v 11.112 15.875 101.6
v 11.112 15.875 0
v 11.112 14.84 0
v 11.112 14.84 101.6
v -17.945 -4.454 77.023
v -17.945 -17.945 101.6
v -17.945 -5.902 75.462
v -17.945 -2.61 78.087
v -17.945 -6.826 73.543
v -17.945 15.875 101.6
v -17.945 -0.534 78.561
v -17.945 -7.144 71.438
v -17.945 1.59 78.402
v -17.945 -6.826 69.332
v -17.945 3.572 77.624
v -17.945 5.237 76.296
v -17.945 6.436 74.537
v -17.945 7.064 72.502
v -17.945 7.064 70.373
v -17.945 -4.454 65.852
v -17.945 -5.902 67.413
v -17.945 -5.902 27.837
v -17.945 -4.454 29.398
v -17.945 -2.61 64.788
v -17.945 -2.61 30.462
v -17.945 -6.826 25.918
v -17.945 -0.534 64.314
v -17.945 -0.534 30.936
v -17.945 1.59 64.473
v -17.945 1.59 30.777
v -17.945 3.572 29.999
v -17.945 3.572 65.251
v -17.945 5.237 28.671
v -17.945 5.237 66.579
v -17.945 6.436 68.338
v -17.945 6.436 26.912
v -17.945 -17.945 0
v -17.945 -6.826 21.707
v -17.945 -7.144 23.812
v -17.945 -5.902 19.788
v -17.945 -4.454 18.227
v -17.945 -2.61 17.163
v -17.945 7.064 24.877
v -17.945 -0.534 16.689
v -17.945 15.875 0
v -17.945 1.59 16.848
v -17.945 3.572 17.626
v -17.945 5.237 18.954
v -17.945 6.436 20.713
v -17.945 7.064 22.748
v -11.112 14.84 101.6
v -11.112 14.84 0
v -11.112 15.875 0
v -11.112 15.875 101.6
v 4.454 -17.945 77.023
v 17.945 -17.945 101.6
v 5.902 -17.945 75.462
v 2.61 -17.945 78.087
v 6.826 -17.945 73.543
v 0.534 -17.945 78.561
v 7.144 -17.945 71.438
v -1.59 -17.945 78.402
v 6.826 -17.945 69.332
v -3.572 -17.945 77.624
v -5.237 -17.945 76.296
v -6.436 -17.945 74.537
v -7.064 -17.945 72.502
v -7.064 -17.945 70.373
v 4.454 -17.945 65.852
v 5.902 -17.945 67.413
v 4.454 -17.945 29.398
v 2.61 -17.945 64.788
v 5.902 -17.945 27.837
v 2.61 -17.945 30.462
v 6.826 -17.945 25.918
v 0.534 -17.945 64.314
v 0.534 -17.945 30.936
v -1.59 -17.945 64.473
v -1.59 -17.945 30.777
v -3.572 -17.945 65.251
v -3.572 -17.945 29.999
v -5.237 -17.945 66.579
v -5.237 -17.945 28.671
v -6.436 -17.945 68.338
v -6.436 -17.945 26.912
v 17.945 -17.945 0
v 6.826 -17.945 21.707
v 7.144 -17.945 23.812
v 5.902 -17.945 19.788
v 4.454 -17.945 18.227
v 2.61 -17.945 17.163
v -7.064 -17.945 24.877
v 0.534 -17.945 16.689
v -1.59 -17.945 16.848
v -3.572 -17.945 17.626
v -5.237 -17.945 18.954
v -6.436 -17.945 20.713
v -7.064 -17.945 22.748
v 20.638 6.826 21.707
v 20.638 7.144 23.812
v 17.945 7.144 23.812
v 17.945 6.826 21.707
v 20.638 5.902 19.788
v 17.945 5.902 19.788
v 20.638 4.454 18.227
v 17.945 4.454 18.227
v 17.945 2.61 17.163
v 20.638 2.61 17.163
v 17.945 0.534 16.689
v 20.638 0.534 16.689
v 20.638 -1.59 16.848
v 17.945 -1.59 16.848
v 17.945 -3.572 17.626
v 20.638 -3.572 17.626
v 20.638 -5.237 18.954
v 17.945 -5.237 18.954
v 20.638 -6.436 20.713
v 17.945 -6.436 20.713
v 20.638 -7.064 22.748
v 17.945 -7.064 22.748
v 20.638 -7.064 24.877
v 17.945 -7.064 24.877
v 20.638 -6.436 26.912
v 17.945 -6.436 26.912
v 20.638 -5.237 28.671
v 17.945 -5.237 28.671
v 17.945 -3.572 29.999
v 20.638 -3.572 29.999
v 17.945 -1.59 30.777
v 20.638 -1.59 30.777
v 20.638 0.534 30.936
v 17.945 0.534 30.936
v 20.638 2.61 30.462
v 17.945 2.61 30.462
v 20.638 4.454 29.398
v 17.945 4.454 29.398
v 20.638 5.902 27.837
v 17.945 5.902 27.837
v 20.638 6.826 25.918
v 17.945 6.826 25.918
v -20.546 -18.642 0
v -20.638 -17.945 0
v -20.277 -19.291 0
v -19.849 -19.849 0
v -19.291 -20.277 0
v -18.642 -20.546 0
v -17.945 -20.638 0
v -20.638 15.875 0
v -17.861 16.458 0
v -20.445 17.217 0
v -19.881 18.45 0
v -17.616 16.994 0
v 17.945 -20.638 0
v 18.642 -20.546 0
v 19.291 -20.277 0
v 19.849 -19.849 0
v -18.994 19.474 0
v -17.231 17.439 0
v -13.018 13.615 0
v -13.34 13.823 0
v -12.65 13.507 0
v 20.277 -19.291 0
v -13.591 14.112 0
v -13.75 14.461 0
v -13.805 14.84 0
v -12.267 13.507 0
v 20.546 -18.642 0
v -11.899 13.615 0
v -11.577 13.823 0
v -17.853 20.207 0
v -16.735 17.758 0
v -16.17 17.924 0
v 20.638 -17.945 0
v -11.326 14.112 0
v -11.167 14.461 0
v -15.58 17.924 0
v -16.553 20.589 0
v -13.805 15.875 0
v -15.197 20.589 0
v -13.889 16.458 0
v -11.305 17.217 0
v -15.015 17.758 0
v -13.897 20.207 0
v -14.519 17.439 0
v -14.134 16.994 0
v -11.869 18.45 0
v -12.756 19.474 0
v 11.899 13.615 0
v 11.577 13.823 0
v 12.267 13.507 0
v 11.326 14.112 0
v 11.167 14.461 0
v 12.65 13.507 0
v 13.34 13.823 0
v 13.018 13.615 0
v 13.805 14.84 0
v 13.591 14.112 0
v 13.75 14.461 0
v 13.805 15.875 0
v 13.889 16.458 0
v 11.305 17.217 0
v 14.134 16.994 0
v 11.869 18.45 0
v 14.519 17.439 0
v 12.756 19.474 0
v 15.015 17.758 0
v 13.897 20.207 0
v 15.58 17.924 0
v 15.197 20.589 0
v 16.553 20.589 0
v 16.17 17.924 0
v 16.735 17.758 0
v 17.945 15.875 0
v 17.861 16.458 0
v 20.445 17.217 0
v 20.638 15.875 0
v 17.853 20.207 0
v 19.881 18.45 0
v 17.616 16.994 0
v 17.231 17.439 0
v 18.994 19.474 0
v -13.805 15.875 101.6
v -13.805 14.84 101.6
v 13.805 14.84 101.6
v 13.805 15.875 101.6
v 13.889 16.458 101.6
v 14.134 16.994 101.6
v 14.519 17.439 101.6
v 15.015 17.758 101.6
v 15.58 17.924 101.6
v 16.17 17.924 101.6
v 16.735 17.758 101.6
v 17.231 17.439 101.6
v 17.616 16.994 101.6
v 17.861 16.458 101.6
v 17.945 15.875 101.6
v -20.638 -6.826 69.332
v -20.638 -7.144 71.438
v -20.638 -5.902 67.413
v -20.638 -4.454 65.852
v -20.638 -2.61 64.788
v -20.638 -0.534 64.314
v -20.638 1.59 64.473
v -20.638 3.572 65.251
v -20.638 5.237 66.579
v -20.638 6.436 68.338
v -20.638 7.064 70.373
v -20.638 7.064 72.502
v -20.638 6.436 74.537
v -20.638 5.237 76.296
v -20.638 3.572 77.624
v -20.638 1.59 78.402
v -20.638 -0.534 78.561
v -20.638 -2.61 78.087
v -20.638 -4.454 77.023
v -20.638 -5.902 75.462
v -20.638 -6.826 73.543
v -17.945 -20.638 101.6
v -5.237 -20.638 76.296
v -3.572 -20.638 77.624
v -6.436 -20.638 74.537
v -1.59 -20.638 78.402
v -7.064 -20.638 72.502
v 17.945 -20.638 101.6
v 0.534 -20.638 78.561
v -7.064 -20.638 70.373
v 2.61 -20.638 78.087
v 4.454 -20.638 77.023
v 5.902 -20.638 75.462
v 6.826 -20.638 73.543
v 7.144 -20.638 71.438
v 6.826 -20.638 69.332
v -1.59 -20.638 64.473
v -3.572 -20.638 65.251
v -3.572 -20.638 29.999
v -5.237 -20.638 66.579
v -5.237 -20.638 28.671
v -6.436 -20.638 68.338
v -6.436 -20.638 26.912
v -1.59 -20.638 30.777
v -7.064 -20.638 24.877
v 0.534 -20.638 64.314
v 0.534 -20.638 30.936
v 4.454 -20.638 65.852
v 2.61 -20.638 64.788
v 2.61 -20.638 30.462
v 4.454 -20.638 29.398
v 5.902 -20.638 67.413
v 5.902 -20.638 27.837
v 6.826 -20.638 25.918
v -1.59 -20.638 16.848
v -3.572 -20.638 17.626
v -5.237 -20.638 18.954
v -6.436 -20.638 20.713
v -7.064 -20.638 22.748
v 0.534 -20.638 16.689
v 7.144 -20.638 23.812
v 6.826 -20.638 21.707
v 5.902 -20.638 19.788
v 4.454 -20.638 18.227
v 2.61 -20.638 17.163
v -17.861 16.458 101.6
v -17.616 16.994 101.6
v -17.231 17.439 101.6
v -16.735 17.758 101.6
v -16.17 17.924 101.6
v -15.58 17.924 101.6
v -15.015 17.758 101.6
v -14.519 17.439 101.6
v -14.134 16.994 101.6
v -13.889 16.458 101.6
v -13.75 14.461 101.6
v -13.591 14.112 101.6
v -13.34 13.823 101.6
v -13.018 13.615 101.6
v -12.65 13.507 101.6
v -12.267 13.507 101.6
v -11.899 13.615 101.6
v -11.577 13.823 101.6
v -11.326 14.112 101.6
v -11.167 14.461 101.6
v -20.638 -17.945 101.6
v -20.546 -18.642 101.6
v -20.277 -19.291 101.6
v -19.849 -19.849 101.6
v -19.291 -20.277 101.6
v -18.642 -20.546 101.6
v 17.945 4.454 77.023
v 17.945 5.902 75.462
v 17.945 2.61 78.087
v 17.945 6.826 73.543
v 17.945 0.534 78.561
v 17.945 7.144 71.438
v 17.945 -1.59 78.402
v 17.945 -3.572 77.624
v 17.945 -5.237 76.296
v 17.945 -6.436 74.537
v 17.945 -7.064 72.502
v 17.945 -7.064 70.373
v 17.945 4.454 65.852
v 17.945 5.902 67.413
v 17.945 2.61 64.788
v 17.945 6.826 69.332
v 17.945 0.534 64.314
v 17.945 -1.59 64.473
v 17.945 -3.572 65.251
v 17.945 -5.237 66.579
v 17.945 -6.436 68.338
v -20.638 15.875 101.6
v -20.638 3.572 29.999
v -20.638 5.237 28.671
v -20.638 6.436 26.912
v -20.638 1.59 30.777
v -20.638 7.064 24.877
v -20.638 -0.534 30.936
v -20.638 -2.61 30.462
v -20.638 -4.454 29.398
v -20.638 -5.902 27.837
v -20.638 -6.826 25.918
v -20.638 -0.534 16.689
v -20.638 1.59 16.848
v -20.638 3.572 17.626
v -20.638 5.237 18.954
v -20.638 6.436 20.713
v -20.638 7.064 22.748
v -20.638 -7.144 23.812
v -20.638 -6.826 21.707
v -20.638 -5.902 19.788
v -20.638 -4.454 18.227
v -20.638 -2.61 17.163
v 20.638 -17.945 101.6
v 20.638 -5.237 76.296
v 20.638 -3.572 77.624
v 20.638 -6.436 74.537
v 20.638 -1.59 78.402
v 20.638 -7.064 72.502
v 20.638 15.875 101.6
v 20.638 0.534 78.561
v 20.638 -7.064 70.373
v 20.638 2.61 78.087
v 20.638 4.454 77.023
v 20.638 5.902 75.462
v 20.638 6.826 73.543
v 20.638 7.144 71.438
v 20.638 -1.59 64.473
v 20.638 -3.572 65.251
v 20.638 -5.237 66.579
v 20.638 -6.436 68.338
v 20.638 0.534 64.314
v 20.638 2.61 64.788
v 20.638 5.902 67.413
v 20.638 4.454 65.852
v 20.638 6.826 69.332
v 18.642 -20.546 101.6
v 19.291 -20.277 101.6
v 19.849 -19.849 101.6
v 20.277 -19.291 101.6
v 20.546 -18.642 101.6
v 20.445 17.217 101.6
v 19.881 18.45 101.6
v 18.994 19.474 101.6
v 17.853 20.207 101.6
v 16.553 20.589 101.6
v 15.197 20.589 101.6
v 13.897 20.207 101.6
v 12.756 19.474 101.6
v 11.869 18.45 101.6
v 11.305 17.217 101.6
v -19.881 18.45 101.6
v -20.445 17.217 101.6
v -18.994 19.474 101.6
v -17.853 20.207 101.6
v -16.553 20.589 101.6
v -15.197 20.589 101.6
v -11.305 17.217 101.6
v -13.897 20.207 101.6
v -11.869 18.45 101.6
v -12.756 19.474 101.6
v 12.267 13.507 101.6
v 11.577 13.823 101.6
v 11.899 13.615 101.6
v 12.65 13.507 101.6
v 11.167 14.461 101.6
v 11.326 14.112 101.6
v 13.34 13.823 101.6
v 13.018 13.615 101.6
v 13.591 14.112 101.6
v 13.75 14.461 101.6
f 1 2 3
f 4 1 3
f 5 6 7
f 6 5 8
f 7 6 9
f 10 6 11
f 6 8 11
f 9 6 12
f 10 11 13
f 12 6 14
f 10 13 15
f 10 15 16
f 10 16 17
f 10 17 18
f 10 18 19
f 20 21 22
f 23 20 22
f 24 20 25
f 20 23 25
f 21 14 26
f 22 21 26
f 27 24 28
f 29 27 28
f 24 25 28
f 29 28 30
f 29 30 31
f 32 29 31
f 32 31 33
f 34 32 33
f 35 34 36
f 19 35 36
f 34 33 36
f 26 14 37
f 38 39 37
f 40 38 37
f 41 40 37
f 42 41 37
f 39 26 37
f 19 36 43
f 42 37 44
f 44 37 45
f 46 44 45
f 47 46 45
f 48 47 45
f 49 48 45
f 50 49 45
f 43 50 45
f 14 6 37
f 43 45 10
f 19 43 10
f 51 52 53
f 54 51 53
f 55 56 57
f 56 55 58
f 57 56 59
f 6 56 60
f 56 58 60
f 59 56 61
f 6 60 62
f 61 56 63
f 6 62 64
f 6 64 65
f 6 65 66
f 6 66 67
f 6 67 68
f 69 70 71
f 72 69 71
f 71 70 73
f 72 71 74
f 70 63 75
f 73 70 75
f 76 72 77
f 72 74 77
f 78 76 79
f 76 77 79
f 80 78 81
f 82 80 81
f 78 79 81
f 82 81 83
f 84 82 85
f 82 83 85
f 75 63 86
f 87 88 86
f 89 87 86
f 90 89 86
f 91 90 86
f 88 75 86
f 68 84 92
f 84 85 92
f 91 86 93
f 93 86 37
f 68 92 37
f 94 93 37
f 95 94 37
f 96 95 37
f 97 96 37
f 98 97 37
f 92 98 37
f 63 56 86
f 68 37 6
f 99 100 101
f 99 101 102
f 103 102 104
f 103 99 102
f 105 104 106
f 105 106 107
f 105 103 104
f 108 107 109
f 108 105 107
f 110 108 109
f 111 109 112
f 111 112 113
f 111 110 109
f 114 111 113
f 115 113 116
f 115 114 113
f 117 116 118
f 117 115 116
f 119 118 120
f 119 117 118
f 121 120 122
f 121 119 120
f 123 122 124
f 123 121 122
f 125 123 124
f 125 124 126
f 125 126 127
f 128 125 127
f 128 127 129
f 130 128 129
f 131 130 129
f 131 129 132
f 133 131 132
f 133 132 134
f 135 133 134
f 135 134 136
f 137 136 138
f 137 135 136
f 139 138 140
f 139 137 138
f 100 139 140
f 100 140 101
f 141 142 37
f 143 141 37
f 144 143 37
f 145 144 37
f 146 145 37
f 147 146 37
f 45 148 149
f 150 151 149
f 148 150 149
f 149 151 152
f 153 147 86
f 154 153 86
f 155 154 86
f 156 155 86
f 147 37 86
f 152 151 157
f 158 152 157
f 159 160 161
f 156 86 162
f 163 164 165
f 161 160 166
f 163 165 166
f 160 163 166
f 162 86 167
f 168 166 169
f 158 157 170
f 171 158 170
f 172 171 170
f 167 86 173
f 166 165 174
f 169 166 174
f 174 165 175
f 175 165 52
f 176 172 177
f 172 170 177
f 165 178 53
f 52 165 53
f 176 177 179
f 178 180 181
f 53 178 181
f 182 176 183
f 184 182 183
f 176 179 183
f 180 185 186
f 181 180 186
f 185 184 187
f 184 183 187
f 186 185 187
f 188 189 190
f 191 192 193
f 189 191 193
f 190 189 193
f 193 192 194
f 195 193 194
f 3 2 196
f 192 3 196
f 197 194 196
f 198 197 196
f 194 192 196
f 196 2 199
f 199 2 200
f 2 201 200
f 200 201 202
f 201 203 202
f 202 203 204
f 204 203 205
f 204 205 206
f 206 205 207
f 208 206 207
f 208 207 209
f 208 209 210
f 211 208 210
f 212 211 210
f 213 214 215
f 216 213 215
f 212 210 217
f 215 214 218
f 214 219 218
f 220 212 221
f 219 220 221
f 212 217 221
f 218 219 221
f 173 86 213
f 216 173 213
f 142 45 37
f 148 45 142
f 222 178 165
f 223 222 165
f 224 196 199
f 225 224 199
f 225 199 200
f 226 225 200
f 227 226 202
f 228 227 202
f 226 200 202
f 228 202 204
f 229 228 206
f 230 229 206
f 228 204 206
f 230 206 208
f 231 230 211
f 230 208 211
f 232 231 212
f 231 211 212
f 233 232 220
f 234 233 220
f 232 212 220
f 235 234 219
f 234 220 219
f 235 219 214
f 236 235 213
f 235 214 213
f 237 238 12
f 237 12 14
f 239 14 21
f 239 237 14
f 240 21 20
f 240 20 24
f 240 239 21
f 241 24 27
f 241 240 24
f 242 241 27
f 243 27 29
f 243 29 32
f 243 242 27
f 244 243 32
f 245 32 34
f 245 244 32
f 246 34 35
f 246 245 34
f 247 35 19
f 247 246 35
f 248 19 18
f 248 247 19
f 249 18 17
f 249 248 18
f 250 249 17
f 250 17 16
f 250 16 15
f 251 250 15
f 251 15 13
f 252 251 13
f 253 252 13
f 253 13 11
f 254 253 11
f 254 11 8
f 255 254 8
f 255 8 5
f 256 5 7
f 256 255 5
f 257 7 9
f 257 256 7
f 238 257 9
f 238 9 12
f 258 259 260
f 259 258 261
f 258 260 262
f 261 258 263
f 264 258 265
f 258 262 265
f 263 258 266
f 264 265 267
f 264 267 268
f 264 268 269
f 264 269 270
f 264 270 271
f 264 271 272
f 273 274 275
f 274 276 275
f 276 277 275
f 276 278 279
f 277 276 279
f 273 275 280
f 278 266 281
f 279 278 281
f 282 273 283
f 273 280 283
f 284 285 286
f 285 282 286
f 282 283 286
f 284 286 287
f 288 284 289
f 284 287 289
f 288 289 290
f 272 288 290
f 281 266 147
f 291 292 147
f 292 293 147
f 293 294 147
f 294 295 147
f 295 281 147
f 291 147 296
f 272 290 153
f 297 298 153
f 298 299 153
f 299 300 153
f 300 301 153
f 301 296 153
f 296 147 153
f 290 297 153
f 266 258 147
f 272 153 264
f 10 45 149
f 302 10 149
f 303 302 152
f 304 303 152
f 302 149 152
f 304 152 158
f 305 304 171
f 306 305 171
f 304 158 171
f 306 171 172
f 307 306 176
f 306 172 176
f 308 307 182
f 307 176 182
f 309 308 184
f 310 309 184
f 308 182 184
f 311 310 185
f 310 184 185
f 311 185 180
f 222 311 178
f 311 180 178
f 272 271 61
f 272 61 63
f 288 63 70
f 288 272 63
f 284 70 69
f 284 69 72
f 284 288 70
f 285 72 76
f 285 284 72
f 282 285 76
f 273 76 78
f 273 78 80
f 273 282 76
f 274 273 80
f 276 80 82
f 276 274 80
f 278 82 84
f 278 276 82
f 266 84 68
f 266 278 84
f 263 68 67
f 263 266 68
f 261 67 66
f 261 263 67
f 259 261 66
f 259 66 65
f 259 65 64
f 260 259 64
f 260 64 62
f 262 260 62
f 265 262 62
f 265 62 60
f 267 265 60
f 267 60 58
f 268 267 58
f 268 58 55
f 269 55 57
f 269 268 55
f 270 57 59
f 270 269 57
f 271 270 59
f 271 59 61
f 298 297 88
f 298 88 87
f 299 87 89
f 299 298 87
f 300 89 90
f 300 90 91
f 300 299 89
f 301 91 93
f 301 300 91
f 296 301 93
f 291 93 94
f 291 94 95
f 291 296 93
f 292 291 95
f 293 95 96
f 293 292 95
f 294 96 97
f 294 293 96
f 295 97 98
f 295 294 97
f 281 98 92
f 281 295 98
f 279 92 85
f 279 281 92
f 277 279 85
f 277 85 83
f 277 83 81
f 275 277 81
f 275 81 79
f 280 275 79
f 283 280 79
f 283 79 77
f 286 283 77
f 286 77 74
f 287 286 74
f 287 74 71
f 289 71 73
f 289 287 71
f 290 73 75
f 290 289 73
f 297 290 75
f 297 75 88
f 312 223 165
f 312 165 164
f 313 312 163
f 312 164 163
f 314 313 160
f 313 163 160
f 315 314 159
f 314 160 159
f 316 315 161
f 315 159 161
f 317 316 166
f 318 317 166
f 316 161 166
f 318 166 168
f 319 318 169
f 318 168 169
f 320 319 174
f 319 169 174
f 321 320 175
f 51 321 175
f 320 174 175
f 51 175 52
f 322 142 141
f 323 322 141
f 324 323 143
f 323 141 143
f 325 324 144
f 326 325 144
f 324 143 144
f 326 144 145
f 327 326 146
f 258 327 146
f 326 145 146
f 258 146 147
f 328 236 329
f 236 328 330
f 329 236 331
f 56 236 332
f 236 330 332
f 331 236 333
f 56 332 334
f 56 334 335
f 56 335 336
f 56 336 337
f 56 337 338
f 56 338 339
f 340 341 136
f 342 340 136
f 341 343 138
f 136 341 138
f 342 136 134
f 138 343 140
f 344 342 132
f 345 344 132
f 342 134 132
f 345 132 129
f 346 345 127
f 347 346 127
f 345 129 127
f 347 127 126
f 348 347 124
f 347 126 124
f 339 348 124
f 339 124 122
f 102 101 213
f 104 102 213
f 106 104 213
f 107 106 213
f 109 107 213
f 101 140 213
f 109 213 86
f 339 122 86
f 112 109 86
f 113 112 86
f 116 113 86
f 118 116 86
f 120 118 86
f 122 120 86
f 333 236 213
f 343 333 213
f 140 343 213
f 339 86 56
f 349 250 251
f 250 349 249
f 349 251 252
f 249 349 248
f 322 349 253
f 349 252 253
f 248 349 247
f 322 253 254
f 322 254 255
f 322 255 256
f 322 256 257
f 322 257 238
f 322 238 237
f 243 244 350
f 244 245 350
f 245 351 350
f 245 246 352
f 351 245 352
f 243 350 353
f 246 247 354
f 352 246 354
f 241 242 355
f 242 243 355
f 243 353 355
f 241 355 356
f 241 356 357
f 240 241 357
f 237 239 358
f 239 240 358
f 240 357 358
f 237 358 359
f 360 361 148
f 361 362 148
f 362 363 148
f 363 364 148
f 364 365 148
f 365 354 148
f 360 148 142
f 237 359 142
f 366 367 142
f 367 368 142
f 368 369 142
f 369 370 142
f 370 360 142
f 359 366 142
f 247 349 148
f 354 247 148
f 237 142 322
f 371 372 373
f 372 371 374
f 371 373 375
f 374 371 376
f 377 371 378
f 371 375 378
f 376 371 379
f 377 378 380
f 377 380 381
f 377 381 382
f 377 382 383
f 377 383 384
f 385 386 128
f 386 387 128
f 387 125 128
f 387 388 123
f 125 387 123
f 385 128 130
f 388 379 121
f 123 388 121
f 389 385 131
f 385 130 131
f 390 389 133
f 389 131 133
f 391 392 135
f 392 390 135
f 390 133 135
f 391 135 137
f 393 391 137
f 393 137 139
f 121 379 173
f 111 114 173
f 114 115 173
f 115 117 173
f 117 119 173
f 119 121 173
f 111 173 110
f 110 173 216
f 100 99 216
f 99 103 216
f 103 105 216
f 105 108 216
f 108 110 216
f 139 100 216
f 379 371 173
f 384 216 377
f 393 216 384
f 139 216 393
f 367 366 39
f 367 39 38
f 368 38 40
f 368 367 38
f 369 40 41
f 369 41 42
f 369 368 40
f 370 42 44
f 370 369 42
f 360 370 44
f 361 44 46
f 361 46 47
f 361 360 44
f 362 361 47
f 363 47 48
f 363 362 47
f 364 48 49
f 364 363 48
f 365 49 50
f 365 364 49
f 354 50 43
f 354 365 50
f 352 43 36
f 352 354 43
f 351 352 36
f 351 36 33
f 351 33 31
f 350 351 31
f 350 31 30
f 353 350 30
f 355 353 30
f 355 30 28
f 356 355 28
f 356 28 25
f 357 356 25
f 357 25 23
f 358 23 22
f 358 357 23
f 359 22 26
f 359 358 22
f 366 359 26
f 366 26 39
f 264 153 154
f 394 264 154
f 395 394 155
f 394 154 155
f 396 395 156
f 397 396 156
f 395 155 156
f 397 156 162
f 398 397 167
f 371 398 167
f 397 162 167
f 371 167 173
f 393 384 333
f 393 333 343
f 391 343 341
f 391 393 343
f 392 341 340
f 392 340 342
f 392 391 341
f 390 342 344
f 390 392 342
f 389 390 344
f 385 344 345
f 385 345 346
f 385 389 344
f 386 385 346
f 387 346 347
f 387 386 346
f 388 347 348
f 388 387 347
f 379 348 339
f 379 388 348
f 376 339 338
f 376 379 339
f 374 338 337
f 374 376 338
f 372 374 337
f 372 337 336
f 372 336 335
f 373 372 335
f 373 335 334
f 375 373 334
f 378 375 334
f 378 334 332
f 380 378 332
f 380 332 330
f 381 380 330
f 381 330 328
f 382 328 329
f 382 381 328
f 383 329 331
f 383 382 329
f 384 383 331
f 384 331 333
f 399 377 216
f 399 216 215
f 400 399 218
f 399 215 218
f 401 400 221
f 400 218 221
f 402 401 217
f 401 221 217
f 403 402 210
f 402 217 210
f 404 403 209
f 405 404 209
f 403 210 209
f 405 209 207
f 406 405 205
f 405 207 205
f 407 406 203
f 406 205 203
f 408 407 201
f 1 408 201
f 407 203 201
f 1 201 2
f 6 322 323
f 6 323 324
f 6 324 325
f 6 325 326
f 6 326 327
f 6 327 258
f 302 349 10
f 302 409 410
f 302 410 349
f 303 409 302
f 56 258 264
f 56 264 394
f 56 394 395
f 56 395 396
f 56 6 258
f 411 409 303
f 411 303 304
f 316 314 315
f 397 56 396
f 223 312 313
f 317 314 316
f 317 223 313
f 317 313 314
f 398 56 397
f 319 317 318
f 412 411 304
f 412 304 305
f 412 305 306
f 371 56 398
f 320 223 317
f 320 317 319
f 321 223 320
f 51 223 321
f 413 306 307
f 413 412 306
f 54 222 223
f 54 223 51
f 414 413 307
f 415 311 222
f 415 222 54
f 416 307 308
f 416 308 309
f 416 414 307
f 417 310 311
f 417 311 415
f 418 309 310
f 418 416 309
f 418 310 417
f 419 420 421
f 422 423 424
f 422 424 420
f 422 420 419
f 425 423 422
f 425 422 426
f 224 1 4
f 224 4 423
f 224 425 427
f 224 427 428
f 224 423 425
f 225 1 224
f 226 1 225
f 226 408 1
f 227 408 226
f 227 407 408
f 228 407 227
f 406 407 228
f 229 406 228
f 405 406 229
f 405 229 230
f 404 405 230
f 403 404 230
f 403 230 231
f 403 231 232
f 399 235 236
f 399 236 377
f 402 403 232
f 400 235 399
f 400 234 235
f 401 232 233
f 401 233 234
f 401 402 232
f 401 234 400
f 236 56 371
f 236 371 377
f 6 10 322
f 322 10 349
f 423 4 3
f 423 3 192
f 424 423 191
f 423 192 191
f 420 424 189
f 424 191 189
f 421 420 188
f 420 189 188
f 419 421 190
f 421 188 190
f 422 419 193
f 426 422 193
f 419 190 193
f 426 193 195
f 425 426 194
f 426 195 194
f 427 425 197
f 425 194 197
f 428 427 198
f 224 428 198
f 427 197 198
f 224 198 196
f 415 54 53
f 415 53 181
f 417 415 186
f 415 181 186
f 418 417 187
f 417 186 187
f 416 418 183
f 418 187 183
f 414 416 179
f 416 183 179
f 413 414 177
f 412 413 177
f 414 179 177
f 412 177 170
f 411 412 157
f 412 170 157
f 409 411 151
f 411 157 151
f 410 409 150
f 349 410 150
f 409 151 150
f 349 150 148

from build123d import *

# Parameters (mm, degrees)
BASE_EXTRUDE_DEPTH                        = 101.6
HOLE1_START                               = -20.6375
HOLE1_OUTLINE_R                           = 7.14375
HOLE1_DEPTH                               = 2.6924
LPATTERN1_COUNT                           = 2
LPATTERN1_PITCH                           = 47.625
CIRPATTERN1_COUNT                         = 2
CIRPATTERN1_ANGLE                         = 90
CIRPATTERN1_START                         = -20.6375
CIRPATTERN1_COPY_1_SKETCH_R               = 7.14375
CIRPATTERN1_COPY_1_DEPTH                  = 2.6924
CIRPATTERN1_THE_OTHER_WAY_COUNT           = 2
CIRPATTERN1_THE_OTHER_WAY_ANGLE           = 90
CIRPATTERN1_THE_OTHER_WAY_COPY_1_SKETCH_R = 7.14375
CIRPATTERN1_THE_OTHER_WAY_COPY_1_DEPTH    = 2.6924


# Read off the part's stored shape, not the designer's step: Hole1
with BuildPart() as part:
    # Sketch1 → Base-Extrude (new body)
    with BuildSketch(Plane.XY):
        with BuildLine():
            Line((-20.6375, 15.875), (-20.6375, -17.9451))
            ThreePointArc((-20.6375, -17.9451), (-19.848914298, -19.848914298), (-17.9451, -20.6375))
            Line((-17.9451, -20.6375), (17.9451, -20.6375))
            ThreePointArc((17.9451, -20.6375), (19.848914298, -19.848914298), (20.6375, -17.9451))
            Line((20.6375, -17.9451), (20.6375, 15.875))
            ThreePointArc((20.6375, 15.875), (15.875, 20.6375), (11.1125, 15.875))
            Line((11.1125, 15.875), (11.1125, 14.83995))
            ThreePointArc((11.1125, 14.83995), (12.4587, 13.49375), (13.8049, 14.83995))
            Line((13.8049, 14.83995), (13.8049, 15.875))
            ThreePointArc((13.8049, 15.875), (15.875, 17.9451), (17.9451, 15.875))
            Line((17.9451, 15.875), (17.9451, -17.9451))
            Line((17.9451, -17.9451), (-17.9451, -17.9451))
            Line((-17.9451, -17.9451), (-17.9451, 15.875))
            ThreePointArc((-17.9451, 15.875), (-15.875, 17.9451), (-13.8049, 15.875))
            Line((-13.8049, 15.875), (-13.8049, 14.83995))
            ThreePointArc((-13.8049, 14.83995), (-12.4587, 13.49375), (-11.1125, 14.83995))
            Line((-11.1125, 14.83995), (-11.1125, 15.875))
            ThreePointArc((-11.1125, 15.875), (-15.875, 20.6375), (-20.6375, 15.875))
        make_face()
    extrude(amount=BASE_EXTRUDE_DEPTH)

    # Hole1 outline → Hole1 (cut)
    with BuildSketch(Plane(origin=(0, 0, 0), x_dir=(1, 0, 0), z_dir=(0, 1, 0)).offset(HOLE1_START)):
        with Locations((0, -23.8125)):
            Circle(HOLE1_OUTLINE_R)
    hole1 = extrude(amount=HOLE1_DEPTH, mode=Mode.SUBTRACT)

    # LPattern1: Hole1 ×2
    with Locations(*[(0, 0, i * LPATTERN1_PITCH) for i in range(1, LPATTERN1_COUNT)]):
        add(hole1, mode=Mode.SUBTRACT)

    # CirPattern1: Hole1 ×2 about axis
    cirpattern1_axis = Axis((0, 0, -50), (0, 0, 1))
    for i in range(1, CIRPATTERN1_COUNT):
        add(hole1.rotate(cirpattern1_axis, i * CIRPATTERN1_ANGLE / (CIRPATTERN1_COUNT - 1)), mode=Mode.SUBTRACT)

    # CirPattern1 copy 1 sketch → CirPattern1 copy 1 (cut)
    with BuildSketch(Plane(origin=(0, 0, 47.625), x_dir=(0, 1, 0), z_dir=(-1, 0, 0)).offset(CIRPATTERN1_START)):
        with Locations((0, -23.8125)):
            Circle(CIRPATTERN1_COPY_1_SKETCH_R)
    extrude(amount=CIRPATTERN1_COPY_1_DEPTH, mode=Mode.SUBTRACT)

    # CirPattern1 the other way: Hole1 ×2 about axis
    cirpattern1_the_other_way_axis = Axis((0, 0, -50), (0, 0, -1))
    for i in range(1, CIRPATTERN1_THE_OTHER_WAY_COUNT):
        add(hole1.rotate(cirpattern1_the_other_way_axis, i * CIRPATTERN1_THE_OTHER_WAY_ANGLE / (CIRPATTERN1_THE_OTHER_WAY_COUNT - 1)), mode=Mode.SUBTRACT)

    # CirPattern1 the other way copy 1 sketch → CirPattern1 the other way copy 1 (cut)
    with BuildSketch(Plane(origin=(0, 0, 47.625), x_dir=(0, -1, 0), z_dir=(1, 0, 0)).offset(CIRPATTERN1_START)):
        with Locations((0, -23.8125)):
            Circle(CIRPATTERN1_THE_OTHER_WAY_COPY_1_SKETCH_R)
    extrude(amount=CIRPATTERN1_THE_OTHER_WAY_COPY_1_DEPTH, mode=Mode.SUBTRACT)


solid = part.part
